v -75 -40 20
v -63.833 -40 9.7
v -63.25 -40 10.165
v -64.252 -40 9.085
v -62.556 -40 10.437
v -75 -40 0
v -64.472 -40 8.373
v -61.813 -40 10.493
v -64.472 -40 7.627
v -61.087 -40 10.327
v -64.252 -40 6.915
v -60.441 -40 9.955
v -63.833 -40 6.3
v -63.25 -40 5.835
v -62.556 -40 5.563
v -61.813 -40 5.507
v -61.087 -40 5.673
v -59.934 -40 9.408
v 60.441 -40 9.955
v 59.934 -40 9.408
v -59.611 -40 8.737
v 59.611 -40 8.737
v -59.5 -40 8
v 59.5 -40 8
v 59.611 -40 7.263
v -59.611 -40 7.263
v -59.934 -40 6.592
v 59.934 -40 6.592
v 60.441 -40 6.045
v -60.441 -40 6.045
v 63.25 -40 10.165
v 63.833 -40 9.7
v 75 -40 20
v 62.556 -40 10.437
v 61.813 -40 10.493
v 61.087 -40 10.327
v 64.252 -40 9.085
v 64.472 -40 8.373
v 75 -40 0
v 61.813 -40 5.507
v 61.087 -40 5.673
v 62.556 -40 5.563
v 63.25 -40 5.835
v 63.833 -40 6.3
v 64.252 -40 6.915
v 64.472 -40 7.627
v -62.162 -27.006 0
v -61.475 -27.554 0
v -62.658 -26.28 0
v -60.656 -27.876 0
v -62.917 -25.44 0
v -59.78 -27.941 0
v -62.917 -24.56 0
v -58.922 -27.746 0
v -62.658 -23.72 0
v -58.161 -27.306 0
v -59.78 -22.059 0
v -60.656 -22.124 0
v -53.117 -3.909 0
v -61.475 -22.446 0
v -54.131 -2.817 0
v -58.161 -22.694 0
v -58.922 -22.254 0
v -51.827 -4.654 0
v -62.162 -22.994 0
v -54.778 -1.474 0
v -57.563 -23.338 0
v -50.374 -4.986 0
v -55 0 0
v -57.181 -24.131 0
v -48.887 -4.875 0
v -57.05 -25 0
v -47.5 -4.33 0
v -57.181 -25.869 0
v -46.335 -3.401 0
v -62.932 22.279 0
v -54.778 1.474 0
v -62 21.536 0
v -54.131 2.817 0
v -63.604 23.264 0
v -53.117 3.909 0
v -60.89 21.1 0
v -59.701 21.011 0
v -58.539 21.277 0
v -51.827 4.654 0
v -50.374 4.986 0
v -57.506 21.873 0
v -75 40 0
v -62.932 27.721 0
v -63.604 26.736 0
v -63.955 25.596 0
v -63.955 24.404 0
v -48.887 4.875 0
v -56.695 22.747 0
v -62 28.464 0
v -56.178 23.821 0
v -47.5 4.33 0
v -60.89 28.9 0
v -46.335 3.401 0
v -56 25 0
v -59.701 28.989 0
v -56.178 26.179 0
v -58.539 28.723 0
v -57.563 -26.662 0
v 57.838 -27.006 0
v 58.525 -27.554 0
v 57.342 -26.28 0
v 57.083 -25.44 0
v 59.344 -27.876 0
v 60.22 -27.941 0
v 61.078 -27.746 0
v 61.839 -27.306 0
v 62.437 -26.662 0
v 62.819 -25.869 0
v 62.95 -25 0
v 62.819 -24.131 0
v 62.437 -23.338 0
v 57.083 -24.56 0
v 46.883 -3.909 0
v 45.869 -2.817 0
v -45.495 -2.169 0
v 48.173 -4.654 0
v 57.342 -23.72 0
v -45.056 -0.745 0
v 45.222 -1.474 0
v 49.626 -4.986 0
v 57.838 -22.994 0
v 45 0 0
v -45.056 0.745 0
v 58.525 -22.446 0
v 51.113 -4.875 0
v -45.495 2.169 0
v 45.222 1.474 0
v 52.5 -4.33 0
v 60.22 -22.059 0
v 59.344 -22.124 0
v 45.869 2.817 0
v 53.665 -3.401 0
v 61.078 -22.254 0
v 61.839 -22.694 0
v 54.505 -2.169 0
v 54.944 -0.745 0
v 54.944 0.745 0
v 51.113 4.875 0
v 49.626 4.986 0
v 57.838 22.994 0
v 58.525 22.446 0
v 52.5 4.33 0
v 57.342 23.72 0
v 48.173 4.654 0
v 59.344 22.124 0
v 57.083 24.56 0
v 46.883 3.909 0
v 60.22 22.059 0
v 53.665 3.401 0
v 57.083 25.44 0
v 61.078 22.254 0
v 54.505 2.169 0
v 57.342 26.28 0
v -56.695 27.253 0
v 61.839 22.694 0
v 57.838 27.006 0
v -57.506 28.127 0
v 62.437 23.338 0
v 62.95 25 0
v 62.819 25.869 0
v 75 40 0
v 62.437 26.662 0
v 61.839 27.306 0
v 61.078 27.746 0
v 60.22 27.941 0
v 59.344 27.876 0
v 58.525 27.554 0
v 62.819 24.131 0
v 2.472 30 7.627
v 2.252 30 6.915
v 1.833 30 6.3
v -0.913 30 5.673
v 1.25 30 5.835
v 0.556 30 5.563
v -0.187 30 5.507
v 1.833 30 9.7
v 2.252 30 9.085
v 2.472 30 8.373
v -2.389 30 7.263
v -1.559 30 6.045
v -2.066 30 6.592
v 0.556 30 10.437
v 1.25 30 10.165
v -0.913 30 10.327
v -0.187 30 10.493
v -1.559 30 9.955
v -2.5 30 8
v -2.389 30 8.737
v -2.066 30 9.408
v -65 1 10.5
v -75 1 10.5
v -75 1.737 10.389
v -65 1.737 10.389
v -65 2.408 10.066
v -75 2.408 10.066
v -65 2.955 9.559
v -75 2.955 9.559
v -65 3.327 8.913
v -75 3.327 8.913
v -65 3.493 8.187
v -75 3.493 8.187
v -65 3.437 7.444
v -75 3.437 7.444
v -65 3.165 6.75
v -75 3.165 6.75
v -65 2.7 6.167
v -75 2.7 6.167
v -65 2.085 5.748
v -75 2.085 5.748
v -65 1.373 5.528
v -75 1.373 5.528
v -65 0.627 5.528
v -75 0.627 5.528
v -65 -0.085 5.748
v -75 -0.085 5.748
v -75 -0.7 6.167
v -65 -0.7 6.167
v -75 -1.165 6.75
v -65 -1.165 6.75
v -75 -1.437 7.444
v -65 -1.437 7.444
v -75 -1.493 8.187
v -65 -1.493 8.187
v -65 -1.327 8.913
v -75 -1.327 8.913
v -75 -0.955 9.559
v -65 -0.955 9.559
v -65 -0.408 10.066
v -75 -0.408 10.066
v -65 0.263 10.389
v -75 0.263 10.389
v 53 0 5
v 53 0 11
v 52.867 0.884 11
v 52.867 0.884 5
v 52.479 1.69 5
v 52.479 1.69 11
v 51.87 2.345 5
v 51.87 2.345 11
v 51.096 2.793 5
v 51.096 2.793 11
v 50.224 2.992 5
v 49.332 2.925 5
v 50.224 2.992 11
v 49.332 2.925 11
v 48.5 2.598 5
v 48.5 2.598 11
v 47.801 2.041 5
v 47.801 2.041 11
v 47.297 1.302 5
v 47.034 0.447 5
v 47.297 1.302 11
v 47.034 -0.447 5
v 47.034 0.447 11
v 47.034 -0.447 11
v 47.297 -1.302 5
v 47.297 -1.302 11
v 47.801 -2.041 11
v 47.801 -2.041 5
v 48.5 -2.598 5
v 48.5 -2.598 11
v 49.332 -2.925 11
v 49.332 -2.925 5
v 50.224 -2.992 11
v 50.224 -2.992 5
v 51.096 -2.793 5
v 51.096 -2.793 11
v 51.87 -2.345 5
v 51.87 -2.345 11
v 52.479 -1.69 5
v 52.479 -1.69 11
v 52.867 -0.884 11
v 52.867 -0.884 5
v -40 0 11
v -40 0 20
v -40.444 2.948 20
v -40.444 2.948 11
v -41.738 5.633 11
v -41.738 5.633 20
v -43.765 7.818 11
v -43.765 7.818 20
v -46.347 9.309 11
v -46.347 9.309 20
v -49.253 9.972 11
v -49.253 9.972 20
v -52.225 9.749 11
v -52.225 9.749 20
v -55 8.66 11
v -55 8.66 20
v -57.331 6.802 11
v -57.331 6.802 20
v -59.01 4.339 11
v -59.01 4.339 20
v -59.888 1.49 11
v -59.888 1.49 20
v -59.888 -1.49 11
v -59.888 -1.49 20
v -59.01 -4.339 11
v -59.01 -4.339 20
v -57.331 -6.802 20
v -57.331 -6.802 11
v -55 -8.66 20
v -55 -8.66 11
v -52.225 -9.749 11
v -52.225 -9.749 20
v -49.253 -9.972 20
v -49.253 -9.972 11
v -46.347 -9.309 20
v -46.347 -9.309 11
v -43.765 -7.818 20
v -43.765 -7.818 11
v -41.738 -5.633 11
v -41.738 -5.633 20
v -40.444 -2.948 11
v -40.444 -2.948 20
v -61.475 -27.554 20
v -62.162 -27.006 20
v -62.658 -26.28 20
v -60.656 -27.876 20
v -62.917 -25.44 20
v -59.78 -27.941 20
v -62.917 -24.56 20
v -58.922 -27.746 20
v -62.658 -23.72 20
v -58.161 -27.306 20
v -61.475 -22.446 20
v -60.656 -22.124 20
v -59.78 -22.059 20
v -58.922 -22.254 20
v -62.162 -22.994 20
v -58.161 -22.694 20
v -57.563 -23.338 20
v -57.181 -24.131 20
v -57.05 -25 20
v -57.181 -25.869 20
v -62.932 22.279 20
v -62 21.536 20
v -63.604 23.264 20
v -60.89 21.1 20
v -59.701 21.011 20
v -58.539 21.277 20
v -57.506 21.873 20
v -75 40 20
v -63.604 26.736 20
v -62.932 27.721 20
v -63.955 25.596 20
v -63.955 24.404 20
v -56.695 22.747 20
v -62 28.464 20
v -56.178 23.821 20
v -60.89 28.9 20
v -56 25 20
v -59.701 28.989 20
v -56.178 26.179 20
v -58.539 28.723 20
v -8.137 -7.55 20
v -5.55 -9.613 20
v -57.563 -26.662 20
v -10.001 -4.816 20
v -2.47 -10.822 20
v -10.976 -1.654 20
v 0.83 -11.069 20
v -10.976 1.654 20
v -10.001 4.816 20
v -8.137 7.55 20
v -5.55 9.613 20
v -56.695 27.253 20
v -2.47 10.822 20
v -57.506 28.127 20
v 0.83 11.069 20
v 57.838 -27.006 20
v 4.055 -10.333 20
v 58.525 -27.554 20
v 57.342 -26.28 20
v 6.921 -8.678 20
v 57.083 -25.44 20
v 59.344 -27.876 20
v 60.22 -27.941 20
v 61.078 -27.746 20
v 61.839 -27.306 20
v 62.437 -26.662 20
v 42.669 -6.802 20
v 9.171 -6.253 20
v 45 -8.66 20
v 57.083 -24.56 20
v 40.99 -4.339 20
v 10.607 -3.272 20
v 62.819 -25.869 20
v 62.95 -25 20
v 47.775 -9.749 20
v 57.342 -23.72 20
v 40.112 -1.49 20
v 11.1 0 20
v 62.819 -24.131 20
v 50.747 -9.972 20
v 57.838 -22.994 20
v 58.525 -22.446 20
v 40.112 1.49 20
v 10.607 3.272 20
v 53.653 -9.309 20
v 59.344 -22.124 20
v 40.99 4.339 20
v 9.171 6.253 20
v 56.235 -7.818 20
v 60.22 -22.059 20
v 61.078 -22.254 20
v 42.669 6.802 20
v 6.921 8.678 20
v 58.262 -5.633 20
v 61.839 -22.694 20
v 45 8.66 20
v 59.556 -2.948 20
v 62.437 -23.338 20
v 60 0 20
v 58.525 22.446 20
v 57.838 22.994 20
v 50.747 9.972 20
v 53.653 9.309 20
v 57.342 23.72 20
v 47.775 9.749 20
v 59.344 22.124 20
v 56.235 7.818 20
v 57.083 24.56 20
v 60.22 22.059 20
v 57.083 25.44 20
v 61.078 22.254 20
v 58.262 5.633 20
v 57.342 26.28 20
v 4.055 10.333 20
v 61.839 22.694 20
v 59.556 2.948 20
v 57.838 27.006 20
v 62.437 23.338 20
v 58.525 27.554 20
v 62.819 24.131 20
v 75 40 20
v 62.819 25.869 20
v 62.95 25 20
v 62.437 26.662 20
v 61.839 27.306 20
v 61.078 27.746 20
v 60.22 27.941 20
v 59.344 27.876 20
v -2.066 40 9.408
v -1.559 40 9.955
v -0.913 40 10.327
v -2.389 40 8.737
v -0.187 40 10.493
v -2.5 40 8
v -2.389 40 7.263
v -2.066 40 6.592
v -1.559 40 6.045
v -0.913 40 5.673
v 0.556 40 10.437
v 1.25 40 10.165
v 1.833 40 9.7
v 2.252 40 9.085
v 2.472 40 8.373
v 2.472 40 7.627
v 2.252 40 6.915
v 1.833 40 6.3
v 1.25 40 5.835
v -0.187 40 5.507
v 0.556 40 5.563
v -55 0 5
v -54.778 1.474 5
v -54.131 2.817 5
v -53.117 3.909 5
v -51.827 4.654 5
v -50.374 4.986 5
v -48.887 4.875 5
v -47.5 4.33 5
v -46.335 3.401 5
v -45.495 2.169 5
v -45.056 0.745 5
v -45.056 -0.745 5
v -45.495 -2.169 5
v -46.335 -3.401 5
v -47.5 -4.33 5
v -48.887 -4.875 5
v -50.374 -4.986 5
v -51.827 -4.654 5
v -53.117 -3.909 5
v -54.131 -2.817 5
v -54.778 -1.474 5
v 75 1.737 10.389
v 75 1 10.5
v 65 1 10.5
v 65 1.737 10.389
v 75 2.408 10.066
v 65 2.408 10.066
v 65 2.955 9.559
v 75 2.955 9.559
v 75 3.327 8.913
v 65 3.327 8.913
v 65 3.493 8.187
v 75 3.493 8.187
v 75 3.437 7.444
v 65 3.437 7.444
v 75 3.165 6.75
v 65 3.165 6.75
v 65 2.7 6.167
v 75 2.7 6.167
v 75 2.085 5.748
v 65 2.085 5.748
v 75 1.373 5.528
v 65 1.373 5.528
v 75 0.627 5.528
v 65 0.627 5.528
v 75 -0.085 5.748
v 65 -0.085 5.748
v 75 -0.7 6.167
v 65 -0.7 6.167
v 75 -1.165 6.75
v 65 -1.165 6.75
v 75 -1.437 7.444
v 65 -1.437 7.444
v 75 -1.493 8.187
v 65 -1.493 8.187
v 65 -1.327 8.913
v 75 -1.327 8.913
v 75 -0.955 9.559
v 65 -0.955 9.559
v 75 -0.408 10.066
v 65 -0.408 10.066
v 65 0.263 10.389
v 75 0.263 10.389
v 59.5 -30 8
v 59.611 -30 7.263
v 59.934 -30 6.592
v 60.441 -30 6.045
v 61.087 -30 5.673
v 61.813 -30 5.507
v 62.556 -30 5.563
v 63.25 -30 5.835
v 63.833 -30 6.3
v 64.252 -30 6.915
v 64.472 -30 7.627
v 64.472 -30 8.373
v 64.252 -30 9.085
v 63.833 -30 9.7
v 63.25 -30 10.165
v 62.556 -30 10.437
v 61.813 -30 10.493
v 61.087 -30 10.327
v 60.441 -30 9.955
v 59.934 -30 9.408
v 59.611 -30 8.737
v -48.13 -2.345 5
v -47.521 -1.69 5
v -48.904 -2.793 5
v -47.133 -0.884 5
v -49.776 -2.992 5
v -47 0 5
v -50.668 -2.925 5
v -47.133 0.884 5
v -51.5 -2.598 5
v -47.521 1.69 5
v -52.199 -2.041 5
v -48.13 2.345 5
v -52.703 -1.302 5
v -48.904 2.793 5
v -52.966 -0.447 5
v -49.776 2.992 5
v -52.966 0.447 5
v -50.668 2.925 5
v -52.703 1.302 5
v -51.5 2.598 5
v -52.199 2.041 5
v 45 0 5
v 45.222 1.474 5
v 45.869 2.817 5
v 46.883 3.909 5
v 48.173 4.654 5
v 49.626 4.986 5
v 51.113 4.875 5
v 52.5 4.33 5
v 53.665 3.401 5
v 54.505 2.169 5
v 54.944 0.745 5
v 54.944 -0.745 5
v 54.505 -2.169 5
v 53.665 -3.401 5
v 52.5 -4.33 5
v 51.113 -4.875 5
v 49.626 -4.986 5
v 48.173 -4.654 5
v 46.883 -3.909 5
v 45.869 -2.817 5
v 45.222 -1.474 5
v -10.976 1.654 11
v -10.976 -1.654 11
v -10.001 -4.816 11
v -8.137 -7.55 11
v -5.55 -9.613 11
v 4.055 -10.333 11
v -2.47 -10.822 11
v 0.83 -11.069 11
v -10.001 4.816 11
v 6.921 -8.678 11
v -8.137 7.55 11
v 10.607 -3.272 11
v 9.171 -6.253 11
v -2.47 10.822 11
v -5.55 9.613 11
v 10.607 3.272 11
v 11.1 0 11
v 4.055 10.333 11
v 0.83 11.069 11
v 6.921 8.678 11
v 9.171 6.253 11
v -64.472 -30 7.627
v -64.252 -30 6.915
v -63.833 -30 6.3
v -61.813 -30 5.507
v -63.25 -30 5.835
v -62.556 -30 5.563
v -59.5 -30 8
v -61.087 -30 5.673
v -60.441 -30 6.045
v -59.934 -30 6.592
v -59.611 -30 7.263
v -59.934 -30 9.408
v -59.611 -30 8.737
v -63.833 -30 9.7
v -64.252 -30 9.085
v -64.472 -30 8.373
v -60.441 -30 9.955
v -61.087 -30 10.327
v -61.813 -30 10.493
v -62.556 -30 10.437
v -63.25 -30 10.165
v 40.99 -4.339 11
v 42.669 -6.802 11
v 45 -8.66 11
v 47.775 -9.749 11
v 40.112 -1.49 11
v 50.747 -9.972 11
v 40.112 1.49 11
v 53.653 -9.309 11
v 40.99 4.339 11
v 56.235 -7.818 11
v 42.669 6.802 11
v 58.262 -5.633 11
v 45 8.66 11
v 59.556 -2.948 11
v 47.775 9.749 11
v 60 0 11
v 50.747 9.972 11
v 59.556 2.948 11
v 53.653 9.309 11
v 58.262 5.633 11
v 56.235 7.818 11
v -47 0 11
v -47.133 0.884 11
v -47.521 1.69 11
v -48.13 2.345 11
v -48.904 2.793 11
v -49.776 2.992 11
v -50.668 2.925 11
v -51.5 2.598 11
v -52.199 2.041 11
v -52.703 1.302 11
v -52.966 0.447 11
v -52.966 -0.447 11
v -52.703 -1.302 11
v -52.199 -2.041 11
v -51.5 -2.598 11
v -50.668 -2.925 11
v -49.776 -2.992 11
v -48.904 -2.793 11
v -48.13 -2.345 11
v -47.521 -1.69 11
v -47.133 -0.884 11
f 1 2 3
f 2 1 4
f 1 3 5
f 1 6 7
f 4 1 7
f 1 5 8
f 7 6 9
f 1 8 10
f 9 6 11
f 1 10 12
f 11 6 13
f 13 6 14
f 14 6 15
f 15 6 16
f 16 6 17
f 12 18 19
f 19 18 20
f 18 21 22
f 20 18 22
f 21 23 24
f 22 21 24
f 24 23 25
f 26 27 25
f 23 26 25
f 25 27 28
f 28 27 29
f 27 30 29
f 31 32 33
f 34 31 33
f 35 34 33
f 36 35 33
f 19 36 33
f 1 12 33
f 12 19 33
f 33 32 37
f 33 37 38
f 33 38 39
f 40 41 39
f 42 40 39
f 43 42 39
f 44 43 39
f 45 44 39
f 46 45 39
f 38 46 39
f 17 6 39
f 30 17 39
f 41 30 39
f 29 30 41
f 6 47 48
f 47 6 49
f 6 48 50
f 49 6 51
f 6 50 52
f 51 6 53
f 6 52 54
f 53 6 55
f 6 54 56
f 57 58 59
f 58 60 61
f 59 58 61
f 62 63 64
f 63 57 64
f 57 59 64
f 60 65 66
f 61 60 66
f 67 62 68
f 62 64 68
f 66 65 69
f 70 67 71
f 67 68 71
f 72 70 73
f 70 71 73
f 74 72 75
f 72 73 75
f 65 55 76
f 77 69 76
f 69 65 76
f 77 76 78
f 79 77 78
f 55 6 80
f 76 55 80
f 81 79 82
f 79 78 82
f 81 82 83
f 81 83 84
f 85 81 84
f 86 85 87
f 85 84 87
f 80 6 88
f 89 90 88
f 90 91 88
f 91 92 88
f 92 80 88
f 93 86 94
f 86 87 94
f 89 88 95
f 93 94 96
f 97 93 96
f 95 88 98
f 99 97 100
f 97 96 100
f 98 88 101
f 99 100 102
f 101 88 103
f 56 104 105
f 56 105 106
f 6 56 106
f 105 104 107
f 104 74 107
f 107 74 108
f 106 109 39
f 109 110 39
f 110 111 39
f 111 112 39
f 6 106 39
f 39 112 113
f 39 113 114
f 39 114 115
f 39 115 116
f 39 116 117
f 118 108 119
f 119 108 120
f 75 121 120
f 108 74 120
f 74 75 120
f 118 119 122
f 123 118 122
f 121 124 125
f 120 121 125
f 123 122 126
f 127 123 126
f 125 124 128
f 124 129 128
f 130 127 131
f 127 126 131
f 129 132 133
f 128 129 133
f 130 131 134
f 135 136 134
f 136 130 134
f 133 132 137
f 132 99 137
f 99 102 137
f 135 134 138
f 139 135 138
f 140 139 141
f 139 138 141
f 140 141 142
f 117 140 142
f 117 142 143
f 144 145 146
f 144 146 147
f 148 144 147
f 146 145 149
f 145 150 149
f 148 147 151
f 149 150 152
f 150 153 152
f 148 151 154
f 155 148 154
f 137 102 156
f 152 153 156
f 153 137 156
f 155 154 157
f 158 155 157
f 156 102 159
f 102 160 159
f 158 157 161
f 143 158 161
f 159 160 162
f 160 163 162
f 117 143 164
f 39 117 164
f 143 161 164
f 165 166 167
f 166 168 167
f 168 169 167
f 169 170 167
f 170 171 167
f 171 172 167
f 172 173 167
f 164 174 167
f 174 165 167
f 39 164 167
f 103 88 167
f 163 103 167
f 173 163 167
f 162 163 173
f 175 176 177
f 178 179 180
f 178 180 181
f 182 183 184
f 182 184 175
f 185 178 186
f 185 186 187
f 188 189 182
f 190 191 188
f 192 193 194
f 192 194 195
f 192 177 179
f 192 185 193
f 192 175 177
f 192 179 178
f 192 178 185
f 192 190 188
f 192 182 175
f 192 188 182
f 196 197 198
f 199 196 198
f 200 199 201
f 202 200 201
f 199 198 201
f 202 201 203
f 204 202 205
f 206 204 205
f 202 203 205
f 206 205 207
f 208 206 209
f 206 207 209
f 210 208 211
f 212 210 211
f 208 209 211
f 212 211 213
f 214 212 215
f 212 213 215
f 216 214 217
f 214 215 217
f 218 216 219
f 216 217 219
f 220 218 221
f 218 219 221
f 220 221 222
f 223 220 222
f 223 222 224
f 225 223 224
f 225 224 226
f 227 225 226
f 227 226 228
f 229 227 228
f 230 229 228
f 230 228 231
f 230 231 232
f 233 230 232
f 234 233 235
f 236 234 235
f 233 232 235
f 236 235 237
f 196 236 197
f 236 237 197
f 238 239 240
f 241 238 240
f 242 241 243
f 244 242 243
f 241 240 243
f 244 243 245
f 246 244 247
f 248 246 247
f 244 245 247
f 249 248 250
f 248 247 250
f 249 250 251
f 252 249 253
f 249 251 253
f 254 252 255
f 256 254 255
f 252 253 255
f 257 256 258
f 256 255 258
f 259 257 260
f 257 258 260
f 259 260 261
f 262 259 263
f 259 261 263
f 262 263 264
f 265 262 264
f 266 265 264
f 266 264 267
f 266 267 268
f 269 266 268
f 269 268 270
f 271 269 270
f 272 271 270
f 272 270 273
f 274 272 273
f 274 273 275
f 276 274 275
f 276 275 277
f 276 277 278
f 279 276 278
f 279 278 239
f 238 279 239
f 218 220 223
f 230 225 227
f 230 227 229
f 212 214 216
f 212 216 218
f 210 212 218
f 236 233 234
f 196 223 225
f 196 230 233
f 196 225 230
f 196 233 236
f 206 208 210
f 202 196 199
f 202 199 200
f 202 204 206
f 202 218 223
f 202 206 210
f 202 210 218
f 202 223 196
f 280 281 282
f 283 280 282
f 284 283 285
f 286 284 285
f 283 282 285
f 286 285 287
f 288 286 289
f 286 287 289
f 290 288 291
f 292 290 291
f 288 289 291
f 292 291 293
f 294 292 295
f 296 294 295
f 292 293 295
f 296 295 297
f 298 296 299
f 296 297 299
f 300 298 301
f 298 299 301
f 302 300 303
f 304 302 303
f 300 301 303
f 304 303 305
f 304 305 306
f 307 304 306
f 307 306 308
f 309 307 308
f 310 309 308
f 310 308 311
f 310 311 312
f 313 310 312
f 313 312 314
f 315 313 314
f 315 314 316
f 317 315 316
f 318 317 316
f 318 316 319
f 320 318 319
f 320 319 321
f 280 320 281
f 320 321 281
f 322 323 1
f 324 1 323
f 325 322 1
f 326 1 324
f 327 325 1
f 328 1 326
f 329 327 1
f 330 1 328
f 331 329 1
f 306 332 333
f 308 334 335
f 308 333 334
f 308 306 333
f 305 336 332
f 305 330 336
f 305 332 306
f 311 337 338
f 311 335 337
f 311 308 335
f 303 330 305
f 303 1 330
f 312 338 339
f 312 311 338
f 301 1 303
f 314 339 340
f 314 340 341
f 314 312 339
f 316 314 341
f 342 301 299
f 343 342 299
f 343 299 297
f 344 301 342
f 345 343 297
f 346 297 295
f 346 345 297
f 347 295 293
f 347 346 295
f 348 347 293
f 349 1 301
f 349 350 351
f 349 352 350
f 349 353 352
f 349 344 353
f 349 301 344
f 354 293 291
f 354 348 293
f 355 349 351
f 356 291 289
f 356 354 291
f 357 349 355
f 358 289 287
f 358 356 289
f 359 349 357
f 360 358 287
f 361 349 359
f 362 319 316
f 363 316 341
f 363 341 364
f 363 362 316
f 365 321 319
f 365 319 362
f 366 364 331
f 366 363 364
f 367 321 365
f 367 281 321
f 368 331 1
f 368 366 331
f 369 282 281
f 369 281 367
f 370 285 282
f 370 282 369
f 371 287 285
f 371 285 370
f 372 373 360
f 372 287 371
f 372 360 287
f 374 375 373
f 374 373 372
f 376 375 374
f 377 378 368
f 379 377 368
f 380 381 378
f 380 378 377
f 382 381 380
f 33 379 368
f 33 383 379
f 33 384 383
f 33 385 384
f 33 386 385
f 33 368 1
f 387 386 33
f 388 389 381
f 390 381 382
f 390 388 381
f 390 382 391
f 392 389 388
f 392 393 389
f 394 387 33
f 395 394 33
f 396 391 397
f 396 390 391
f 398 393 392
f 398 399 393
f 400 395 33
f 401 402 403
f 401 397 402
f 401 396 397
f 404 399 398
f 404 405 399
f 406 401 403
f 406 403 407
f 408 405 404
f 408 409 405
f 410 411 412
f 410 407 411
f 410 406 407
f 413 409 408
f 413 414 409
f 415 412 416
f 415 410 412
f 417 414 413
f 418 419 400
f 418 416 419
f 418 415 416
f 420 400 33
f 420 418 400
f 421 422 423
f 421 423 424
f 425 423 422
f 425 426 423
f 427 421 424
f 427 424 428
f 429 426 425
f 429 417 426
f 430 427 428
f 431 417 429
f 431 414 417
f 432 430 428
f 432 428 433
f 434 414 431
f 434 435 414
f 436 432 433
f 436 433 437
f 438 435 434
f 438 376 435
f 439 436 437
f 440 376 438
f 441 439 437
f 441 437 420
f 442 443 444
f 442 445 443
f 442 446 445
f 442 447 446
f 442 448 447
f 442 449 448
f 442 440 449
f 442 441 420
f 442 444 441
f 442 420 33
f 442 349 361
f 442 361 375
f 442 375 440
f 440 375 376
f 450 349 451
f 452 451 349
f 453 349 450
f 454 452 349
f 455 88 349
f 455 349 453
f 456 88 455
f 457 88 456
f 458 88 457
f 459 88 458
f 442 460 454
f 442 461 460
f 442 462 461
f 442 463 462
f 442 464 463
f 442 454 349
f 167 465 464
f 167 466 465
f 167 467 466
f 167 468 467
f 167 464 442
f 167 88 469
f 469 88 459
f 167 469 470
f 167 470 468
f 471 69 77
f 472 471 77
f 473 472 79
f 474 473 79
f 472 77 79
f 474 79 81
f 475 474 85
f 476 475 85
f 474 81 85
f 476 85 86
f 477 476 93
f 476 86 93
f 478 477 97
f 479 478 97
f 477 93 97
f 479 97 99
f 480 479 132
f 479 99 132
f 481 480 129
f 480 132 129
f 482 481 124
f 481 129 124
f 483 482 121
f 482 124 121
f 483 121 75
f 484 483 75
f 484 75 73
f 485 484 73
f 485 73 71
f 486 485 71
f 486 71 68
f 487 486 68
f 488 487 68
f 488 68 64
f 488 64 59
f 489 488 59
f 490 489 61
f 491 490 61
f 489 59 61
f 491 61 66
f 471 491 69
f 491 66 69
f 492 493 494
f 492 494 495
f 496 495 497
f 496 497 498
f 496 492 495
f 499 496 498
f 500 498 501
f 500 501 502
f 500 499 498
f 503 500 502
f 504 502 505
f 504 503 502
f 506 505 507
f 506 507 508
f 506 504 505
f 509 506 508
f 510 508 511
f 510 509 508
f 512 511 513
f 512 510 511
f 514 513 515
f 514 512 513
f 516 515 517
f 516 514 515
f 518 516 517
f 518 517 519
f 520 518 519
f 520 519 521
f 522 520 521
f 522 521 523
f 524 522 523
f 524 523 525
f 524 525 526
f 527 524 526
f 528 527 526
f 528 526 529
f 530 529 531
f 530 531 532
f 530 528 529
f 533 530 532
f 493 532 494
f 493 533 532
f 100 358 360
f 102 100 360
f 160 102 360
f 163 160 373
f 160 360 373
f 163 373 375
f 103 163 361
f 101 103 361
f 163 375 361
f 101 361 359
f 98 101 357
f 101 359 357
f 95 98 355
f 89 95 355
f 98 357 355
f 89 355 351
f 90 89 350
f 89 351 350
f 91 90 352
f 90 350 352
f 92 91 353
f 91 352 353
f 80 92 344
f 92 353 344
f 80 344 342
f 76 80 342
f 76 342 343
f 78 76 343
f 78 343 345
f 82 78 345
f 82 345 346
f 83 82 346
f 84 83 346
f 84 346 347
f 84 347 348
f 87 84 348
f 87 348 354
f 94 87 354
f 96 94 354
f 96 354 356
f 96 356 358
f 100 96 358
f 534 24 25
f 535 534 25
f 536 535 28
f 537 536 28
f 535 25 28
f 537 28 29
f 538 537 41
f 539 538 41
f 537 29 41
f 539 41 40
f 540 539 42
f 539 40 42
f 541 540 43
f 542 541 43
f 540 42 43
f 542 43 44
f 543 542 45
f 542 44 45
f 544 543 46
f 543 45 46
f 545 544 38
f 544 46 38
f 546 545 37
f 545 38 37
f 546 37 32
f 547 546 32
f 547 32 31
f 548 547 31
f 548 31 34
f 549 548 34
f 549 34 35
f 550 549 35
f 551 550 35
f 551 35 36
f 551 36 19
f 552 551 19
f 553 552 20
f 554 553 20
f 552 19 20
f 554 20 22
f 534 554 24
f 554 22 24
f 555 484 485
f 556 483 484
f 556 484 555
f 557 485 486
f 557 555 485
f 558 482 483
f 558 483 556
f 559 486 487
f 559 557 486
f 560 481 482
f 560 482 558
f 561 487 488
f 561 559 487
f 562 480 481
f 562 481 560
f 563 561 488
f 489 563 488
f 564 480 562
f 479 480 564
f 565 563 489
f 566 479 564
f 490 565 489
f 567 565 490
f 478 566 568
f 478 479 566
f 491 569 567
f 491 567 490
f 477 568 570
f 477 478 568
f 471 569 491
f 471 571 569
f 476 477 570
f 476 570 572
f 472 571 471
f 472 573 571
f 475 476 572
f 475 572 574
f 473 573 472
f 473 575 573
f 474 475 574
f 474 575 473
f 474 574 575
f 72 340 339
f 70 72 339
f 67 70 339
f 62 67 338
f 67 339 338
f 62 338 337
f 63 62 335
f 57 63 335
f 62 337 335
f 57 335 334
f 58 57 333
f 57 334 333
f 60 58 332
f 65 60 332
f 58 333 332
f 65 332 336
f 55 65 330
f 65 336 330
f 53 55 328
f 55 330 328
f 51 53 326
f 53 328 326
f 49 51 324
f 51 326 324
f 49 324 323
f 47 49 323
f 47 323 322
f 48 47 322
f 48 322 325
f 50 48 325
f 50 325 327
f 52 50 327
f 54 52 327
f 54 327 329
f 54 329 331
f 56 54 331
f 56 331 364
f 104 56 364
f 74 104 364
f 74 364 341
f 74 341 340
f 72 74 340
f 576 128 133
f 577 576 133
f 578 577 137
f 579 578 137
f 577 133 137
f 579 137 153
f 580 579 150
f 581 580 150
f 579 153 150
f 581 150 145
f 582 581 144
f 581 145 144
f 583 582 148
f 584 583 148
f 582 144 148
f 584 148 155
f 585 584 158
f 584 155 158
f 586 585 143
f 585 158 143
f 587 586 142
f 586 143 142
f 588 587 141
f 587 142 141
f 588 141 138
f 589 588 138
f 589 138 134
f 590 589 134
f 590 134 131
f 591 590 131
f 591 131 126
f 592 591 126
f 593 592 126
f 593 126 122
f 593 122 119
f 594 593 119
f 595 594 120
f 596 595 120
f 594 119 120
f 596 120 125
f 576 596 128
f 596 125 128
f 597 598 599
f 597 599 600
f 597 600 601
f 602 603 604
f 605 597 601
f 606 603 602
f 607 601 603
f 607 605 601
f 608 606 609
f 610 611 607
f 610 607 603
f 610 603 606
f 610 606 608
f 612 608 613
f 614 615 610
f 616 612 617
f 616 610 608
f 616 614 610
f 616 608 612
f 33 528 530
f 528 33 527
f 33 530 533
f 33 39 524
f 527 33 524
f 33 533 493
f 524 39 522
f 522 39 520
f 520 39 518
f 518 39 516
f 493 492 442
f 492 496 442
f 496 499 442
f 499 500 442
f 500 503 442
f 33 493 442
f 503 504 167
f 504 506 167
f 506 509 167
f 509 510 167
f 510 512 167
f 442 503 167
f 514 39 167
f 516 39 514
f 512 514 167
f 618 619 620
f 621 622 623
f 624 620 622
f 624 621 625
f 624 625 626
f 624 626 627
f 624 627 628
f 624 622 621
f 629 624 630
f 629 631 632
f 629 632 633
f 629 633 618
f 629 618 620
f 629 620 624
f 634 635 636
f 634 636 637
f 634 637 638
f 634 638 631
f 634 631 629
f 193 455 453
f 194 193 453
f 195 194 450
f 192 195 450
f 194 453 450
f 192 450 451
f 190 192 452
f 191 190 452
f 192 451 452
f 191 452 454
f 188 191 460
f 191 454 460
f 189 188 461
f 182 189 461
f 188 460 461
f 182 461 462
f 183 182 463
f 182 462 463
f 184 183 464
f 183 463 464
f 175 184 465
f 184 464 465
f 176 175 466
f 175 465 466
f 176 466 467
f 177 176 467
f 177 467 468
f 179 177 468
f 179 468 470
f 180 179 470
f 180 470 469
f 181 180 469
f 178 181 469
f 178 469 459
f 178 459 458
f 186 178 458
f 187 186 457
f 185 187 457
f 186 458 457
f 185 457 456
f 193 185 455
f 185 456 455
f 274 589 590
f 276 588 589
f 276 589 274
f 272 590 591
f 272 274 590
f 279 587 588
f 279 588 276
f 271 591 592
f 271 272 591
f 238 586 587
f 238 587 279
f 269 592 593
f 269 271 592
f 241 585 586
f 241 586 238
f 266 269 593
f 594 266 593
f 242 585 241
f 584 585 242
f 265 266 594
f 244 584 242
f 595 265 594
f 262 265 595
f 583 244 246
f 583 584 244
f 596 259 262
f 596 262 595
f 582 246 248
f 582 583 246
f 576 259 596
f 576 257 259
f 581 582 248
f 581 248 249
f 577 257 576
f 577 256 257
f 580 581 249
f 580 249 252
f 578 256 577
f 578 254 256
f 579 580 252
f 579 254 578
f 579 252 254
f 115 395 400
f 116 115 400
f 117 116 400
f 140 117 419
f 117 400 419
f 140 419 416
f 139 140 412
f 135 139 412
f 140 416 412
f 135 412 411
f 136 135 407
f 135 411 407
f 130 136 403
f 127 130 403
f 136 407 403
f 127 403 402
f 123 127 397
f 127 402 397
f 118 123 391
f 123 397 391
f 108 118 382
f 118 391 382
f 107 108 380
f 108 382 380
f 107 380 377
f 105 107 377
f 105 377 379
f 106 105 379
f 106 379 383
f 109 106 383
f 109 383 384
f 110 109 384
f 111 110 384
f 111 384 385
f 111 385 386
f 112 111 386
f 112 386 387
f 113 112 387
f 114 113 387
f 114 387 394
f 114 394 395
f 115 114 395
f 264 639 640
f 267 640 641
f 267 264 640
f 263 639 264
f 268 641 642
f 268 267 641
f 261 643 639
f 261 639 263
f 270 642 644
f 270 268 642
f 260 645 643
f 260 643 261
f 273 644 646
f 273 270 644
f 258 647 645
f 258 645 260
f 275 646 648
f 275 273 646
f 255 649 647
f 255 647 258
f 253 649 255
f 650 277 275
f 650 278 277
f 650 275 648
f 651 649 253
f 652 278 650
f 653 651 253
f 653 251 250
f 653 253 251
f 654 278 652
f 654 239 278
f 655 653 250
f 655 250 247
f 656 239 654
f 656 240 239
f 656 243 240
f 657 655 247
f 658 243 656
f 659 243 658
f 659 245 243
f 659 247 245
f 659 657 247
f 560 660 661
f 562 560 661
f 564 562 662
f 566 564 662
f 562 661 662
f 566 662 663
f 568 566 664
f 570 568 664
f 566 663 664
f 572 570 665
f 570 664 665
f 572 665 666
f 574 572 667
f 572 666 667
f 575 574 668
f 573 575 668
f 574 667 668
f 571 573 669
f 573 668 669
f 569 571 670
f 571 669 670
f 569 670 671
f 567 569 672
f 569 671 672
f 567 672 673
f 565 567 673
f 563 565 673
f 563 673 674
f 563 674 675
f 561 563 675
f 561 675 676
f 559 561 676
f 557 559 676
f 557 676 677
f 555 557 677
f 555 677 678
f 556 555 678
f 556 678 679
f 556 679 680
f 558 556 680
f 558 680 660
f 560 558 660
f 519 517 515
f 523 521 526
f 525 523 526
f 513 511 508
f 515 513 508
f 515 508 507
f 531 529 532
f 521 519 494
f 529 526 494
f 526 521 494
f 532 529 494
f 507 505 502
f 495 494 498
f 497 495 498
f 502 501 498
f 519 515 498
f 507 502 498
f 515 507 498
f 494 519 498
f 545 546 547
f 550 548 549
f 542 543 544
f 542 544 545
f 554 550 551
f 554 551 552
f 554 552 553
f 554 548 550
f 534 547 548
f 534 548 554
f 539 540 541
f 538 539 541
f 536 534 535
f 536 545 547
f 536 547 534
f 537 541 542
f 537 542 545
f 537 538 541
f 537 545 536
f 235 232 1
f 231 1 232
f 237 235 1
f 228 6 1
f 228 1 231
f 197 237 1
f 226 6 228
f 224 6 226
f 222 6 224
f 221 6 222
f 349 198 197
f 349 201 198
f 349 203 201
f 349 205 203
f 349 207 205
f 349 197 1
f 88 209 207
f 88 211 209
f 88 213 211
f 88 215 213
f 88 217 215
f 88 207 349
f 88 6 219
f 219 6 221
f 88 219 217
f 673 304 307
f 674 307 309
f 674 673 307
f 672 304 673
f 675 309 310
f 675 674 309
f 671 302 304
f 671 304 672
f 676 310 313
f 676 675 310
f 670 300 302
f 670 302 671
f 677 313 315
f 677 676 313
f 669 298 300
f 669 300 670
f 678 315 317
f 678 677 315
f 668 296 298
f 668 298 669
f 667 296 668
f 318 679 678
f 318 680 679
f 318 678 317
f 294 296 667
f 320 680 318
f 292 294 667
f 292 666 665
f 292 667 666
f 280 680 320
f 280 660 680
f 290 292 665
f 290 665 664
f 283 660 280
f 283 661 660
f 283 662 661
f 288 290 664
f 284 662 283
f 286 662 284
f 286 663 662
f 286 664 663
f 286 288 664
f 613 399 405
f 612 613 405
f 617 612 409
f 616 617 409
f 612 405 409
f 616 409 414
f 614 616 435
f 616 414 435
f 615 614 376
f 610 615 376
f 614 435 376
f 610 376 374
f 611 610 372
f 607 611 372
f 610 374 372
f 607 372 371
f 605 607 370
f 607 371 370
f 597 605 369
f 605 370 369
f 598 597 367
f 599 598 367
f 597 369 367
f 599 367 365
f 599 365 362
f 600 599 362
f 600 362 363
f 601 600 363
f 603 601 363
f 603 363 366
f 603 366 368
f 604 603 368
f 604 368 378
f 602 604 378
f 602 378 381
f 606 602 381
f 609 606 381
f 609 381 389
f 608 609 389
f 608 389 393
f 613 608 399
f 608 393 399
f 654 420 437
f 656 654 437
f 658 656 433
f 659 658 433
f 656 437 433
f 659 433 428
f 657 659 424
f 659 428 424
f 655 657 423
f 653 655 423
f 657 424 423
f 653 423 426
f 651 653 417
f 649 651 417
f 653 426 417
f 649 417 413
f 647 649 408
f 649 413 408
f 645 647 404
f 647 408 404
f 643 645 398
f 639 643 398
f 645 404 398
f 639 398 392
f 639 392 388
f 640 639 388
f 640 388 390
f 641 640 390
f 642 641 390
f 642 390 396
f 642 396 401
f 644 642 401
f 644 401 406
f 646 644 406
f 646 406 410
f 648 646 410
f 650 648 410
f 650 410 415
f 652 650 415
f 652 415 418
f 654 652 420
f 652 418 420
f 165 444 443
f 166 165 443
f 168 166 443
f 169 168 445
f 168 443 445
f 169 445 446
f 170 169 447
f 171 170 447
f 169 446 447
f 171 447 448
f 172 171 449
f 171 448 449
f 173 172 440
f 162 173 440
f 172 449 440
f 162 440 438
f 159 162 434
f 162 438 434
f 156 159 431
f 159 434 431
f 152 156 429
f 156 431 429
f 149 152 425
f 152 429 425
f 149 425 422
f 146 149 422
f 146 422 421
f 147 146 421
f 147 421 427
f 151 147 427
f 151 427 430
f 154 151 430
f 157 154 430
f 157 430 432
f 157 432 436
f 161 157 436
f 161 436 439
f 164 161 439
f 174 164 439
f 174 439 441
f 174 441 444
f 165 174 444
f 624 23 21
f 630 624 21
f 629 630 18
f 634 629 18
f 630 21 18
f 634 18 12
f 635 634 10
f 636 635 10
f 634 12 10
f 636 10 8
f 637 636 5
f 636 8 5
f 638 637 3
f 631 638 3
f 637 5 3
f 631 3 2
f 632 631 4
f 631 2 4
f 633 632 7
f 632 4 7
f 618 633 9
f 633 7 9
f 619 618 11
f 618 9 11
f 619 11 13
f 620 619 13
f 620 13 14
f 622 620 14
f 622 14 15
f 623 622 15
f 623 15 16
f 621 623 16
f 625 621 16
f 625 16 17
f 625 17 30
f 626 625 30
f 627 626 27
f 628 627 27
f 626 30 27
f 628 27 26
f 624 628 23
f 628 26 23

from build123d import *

# Parameters (mm, degrees)
SKETCH1_W           = 150
SKETCH1_H           = 80
BOSS_EXTRUDE1_DEPTH = 20
CUT_EXTRUDE1_REACH  = 89.321
SKETCH2_R           = 3
SKETCH3_R           = 11.1
SKETCH3_R_2         = 10
CUT_EXTRUDE2_DEPTH  = 9
CUT_EXTRUDE3_REACH  = 89.321
SKETCH4_R           = 4
SKETCH4_R_2         = 2.949605035
SKETCH5_R           = 5
CUT_EXTRUDE4_DEPTH  = 5
SKETCH6_R           = 2.5
CUT_EXTRUDE5_DEPTH  = 10
SKETCH7_R           = 2.5
CUT_EXTRUDE6_DEPTH  = 10
SKETCH8_R           = 2.5
CUT_EXTRUDE7_DEPTH  = 10


with BuildPart() as part:
    # Sketch1 → Boss-Extrude1 (new body)
    with BuildSketch(Plane.XY):
        Rectangle(SKETCH1_W, SKETCH1_H)
    extrude(amount=BOSS_EXTRUDE1_DEPTH)

    # Sketch2 → Cut-Extrude1 (cut, up to next)
    with BuildSketch(Plane.XY.offset(20), mode=Mode.PRIVATE) as cut_extrude1_sk1:
        with Locations((-50, 0)):
            Circle(SKETCH2_R)
    cut_extrude1_tool1 = extrude(cut_extrude1_sk1.sketch, amount=-CUT_EXTRUDE1_REACH, mode=Mode.PRIVATE) & part.part
    # Sketch2 → Cut-Extrude1 (cut, up to next)
    with BuildSketch(Plane.XY.offset(20), mode=Mode.PRIVATE) as cut_extrude1_sk2:
        with Locations((50, 0)):
            Circle(SKETCH2_R)
    cut_extrude1_tool2 = extrude(cut_extrude1_sk2.sketch, amount=-CUT_EXTRUDE1_REACH, mode=Mode.PRIVATE) & part.part
    add(cut_extrude1_tool1.solids().sort_by_distance((-50, 0, 20))[0], mode=Mode.SUBTRACT)
    add(cut_extrude1_tool2.solids().sort_by_distance((50, 0, 20))[0], mode=Mode.SUBTRACT)

    # Sketch3 → Cut-Extrude2 (cut)
    with BuildSketch(Plane.XY.offset(20)):
        Circle(SKETCH3_R)
        with Locations((-50, 0)):
            Circle(SKETCH3_R_2)
        with Locations((50, 0)):
            Circle(SKETCH3_R_2)
    extrude(amount=-CUT_EXTRUDE2_DEPTH, mode=Mode.SUBTRACT)

    # Sketch4 → Cut-Extrude3 (cut, up to next)
    with BuildSketch(Plane.XY.offset(20), mode=Mode.PRIVATE) as cut_extrude3_sk1:
        with Locations((-60, 25)):
            Circle(SKETCH4_R)
    cut_extrude3_tool1 = extrude(cut_extrude3_sk1.sketch, amount=-CUT_EXTRUDE3_REACH, mode=Mode.PRIVATE) & part.part
    # Sketch4 → Cut-Extrude3 (cut, up to next)
    with BuildSketch(Plane.XY.offset(20), mode=Mode.PRIVATE) as cut_extrude3_sk2:
        with Locations((60, 25)):
            Circle(SKETCH4_R_2)
    cut_extrude3_tool2 = extrude(cut_extrude3_sk2.sketch, amount=-CUT_EXTRUDE3_REACH, mode=Mode.PRIVATE) & part.part
    # Sketch4 → Cut-Extrude3 (cut, up to next)
    with BuildSketch(Plane.XY.offset(20), mode=Mode.PRIVATE) as cut_extrude3_sk3:
        with Locations((60, -25)):
            Circle(SKETCH4_R_2)
    cut_extrude3_tool3 = extrude(cut_extrude3_sk3.sketch, amount=-CUT_EXTRUDE3_REACH, mode=Mode.PRIVATE) & part.part
    # Sketch4 → Cut-Extrude3 (cut, up to next)
    with BuildSketch(Plane.XY.offset(20), mode=Mode.PRIVATE) as cut_extrude3_sk4:
        with Locations((-60, -25)):
            Circle(SKETCH4_R_2)
    cut_extrude3_tool4 = extrude(cut_extrude3_sk4.sketch, amount=-CUT_EXTRUDE3_REACH, mode=Mode.PRIVATE) & part.part
    add(cut_extrude3_tool1.solids().sort_by_distance((-60, 25, 20))[0], mode=Mode.SUBTRACT)
    add(cut_extrude3_tool2.solids().sort_by_distance((60, 25, 20))[0], mode=Mode.SUBTRACT)
    add(cut_extrude3_tool3.solids().sort_by_distance((60, -25, 20))[0], mode=Mode.SUBTRACT)
    add(cut_extrude3_tool4.solids().sort_by_distance((-60, -25, 20))[0], mode=Mode.SUBTRACT)

    # Sketch5 → Cut-Extrude4 (cut)
    with BuildSketch(Plane(origin=(0, 0, 0), x_dir=(-1, 0, 0), z_dir=(0, 0, -1))):
        with Locations((-50, 0)):
            Circle(SKETCH5_R)
        with Locations((50, 0)):
            Circle(SKETCH5_R)
    extrude(amount=-CUT_EXTRUDE4_DEPTH, mode=Mode.SUBTRACT)

    # Sketch6 → Cut-Extrude5 (cut)
    with BuildSketch(Plane.ZY.offset(75)):
        with Locations((8, 1)):
            Circle(SKETCH6_R)
    cut_extrude5 = extrude(amount=-CUT_EXTRUDE5_DEPTH, mode=Mode.SUBTRACT)

    # Mirror1: Cut-Extrude5 across plane
    add(cut_extrude5.mirror(Plane(origin=(0, 0, 0), x_dir=(0, 0, 1), z_dir=(1, 0, 0))), mode=Mode.SUBTRACT)

    # Sketch7 → Cut-Extrude6 (cut)
    with BuildSketch(Plane.XZ.offset(40)):
        with Locations((-62, 8)):
            Circle(SKETCH7_R)
        with Locations(Location((62, 8, 0), (0, 0, 180))):
            Circle(SKETCH7_R)
    extrude(amount=-CUT_EXTRUDE6_DEPTH, mode=Mode.SUBTRACT)

    # Sketch8 → Cut-Extrude7 (cut)
    with BuildSketch(Plane(origin=(0, 40, 0), x_dir=(1, 0, 0), z_dir=(0, 1, 0))):
        with Locations(Location((0, -8, 0), (0, 0, 180))):
            Circle(SKETCH8_R)
    extrude(amount=-CUT_EXTRUDE7_DEPTH, mode=Mode.SUBTRACT)


solid = part.part
